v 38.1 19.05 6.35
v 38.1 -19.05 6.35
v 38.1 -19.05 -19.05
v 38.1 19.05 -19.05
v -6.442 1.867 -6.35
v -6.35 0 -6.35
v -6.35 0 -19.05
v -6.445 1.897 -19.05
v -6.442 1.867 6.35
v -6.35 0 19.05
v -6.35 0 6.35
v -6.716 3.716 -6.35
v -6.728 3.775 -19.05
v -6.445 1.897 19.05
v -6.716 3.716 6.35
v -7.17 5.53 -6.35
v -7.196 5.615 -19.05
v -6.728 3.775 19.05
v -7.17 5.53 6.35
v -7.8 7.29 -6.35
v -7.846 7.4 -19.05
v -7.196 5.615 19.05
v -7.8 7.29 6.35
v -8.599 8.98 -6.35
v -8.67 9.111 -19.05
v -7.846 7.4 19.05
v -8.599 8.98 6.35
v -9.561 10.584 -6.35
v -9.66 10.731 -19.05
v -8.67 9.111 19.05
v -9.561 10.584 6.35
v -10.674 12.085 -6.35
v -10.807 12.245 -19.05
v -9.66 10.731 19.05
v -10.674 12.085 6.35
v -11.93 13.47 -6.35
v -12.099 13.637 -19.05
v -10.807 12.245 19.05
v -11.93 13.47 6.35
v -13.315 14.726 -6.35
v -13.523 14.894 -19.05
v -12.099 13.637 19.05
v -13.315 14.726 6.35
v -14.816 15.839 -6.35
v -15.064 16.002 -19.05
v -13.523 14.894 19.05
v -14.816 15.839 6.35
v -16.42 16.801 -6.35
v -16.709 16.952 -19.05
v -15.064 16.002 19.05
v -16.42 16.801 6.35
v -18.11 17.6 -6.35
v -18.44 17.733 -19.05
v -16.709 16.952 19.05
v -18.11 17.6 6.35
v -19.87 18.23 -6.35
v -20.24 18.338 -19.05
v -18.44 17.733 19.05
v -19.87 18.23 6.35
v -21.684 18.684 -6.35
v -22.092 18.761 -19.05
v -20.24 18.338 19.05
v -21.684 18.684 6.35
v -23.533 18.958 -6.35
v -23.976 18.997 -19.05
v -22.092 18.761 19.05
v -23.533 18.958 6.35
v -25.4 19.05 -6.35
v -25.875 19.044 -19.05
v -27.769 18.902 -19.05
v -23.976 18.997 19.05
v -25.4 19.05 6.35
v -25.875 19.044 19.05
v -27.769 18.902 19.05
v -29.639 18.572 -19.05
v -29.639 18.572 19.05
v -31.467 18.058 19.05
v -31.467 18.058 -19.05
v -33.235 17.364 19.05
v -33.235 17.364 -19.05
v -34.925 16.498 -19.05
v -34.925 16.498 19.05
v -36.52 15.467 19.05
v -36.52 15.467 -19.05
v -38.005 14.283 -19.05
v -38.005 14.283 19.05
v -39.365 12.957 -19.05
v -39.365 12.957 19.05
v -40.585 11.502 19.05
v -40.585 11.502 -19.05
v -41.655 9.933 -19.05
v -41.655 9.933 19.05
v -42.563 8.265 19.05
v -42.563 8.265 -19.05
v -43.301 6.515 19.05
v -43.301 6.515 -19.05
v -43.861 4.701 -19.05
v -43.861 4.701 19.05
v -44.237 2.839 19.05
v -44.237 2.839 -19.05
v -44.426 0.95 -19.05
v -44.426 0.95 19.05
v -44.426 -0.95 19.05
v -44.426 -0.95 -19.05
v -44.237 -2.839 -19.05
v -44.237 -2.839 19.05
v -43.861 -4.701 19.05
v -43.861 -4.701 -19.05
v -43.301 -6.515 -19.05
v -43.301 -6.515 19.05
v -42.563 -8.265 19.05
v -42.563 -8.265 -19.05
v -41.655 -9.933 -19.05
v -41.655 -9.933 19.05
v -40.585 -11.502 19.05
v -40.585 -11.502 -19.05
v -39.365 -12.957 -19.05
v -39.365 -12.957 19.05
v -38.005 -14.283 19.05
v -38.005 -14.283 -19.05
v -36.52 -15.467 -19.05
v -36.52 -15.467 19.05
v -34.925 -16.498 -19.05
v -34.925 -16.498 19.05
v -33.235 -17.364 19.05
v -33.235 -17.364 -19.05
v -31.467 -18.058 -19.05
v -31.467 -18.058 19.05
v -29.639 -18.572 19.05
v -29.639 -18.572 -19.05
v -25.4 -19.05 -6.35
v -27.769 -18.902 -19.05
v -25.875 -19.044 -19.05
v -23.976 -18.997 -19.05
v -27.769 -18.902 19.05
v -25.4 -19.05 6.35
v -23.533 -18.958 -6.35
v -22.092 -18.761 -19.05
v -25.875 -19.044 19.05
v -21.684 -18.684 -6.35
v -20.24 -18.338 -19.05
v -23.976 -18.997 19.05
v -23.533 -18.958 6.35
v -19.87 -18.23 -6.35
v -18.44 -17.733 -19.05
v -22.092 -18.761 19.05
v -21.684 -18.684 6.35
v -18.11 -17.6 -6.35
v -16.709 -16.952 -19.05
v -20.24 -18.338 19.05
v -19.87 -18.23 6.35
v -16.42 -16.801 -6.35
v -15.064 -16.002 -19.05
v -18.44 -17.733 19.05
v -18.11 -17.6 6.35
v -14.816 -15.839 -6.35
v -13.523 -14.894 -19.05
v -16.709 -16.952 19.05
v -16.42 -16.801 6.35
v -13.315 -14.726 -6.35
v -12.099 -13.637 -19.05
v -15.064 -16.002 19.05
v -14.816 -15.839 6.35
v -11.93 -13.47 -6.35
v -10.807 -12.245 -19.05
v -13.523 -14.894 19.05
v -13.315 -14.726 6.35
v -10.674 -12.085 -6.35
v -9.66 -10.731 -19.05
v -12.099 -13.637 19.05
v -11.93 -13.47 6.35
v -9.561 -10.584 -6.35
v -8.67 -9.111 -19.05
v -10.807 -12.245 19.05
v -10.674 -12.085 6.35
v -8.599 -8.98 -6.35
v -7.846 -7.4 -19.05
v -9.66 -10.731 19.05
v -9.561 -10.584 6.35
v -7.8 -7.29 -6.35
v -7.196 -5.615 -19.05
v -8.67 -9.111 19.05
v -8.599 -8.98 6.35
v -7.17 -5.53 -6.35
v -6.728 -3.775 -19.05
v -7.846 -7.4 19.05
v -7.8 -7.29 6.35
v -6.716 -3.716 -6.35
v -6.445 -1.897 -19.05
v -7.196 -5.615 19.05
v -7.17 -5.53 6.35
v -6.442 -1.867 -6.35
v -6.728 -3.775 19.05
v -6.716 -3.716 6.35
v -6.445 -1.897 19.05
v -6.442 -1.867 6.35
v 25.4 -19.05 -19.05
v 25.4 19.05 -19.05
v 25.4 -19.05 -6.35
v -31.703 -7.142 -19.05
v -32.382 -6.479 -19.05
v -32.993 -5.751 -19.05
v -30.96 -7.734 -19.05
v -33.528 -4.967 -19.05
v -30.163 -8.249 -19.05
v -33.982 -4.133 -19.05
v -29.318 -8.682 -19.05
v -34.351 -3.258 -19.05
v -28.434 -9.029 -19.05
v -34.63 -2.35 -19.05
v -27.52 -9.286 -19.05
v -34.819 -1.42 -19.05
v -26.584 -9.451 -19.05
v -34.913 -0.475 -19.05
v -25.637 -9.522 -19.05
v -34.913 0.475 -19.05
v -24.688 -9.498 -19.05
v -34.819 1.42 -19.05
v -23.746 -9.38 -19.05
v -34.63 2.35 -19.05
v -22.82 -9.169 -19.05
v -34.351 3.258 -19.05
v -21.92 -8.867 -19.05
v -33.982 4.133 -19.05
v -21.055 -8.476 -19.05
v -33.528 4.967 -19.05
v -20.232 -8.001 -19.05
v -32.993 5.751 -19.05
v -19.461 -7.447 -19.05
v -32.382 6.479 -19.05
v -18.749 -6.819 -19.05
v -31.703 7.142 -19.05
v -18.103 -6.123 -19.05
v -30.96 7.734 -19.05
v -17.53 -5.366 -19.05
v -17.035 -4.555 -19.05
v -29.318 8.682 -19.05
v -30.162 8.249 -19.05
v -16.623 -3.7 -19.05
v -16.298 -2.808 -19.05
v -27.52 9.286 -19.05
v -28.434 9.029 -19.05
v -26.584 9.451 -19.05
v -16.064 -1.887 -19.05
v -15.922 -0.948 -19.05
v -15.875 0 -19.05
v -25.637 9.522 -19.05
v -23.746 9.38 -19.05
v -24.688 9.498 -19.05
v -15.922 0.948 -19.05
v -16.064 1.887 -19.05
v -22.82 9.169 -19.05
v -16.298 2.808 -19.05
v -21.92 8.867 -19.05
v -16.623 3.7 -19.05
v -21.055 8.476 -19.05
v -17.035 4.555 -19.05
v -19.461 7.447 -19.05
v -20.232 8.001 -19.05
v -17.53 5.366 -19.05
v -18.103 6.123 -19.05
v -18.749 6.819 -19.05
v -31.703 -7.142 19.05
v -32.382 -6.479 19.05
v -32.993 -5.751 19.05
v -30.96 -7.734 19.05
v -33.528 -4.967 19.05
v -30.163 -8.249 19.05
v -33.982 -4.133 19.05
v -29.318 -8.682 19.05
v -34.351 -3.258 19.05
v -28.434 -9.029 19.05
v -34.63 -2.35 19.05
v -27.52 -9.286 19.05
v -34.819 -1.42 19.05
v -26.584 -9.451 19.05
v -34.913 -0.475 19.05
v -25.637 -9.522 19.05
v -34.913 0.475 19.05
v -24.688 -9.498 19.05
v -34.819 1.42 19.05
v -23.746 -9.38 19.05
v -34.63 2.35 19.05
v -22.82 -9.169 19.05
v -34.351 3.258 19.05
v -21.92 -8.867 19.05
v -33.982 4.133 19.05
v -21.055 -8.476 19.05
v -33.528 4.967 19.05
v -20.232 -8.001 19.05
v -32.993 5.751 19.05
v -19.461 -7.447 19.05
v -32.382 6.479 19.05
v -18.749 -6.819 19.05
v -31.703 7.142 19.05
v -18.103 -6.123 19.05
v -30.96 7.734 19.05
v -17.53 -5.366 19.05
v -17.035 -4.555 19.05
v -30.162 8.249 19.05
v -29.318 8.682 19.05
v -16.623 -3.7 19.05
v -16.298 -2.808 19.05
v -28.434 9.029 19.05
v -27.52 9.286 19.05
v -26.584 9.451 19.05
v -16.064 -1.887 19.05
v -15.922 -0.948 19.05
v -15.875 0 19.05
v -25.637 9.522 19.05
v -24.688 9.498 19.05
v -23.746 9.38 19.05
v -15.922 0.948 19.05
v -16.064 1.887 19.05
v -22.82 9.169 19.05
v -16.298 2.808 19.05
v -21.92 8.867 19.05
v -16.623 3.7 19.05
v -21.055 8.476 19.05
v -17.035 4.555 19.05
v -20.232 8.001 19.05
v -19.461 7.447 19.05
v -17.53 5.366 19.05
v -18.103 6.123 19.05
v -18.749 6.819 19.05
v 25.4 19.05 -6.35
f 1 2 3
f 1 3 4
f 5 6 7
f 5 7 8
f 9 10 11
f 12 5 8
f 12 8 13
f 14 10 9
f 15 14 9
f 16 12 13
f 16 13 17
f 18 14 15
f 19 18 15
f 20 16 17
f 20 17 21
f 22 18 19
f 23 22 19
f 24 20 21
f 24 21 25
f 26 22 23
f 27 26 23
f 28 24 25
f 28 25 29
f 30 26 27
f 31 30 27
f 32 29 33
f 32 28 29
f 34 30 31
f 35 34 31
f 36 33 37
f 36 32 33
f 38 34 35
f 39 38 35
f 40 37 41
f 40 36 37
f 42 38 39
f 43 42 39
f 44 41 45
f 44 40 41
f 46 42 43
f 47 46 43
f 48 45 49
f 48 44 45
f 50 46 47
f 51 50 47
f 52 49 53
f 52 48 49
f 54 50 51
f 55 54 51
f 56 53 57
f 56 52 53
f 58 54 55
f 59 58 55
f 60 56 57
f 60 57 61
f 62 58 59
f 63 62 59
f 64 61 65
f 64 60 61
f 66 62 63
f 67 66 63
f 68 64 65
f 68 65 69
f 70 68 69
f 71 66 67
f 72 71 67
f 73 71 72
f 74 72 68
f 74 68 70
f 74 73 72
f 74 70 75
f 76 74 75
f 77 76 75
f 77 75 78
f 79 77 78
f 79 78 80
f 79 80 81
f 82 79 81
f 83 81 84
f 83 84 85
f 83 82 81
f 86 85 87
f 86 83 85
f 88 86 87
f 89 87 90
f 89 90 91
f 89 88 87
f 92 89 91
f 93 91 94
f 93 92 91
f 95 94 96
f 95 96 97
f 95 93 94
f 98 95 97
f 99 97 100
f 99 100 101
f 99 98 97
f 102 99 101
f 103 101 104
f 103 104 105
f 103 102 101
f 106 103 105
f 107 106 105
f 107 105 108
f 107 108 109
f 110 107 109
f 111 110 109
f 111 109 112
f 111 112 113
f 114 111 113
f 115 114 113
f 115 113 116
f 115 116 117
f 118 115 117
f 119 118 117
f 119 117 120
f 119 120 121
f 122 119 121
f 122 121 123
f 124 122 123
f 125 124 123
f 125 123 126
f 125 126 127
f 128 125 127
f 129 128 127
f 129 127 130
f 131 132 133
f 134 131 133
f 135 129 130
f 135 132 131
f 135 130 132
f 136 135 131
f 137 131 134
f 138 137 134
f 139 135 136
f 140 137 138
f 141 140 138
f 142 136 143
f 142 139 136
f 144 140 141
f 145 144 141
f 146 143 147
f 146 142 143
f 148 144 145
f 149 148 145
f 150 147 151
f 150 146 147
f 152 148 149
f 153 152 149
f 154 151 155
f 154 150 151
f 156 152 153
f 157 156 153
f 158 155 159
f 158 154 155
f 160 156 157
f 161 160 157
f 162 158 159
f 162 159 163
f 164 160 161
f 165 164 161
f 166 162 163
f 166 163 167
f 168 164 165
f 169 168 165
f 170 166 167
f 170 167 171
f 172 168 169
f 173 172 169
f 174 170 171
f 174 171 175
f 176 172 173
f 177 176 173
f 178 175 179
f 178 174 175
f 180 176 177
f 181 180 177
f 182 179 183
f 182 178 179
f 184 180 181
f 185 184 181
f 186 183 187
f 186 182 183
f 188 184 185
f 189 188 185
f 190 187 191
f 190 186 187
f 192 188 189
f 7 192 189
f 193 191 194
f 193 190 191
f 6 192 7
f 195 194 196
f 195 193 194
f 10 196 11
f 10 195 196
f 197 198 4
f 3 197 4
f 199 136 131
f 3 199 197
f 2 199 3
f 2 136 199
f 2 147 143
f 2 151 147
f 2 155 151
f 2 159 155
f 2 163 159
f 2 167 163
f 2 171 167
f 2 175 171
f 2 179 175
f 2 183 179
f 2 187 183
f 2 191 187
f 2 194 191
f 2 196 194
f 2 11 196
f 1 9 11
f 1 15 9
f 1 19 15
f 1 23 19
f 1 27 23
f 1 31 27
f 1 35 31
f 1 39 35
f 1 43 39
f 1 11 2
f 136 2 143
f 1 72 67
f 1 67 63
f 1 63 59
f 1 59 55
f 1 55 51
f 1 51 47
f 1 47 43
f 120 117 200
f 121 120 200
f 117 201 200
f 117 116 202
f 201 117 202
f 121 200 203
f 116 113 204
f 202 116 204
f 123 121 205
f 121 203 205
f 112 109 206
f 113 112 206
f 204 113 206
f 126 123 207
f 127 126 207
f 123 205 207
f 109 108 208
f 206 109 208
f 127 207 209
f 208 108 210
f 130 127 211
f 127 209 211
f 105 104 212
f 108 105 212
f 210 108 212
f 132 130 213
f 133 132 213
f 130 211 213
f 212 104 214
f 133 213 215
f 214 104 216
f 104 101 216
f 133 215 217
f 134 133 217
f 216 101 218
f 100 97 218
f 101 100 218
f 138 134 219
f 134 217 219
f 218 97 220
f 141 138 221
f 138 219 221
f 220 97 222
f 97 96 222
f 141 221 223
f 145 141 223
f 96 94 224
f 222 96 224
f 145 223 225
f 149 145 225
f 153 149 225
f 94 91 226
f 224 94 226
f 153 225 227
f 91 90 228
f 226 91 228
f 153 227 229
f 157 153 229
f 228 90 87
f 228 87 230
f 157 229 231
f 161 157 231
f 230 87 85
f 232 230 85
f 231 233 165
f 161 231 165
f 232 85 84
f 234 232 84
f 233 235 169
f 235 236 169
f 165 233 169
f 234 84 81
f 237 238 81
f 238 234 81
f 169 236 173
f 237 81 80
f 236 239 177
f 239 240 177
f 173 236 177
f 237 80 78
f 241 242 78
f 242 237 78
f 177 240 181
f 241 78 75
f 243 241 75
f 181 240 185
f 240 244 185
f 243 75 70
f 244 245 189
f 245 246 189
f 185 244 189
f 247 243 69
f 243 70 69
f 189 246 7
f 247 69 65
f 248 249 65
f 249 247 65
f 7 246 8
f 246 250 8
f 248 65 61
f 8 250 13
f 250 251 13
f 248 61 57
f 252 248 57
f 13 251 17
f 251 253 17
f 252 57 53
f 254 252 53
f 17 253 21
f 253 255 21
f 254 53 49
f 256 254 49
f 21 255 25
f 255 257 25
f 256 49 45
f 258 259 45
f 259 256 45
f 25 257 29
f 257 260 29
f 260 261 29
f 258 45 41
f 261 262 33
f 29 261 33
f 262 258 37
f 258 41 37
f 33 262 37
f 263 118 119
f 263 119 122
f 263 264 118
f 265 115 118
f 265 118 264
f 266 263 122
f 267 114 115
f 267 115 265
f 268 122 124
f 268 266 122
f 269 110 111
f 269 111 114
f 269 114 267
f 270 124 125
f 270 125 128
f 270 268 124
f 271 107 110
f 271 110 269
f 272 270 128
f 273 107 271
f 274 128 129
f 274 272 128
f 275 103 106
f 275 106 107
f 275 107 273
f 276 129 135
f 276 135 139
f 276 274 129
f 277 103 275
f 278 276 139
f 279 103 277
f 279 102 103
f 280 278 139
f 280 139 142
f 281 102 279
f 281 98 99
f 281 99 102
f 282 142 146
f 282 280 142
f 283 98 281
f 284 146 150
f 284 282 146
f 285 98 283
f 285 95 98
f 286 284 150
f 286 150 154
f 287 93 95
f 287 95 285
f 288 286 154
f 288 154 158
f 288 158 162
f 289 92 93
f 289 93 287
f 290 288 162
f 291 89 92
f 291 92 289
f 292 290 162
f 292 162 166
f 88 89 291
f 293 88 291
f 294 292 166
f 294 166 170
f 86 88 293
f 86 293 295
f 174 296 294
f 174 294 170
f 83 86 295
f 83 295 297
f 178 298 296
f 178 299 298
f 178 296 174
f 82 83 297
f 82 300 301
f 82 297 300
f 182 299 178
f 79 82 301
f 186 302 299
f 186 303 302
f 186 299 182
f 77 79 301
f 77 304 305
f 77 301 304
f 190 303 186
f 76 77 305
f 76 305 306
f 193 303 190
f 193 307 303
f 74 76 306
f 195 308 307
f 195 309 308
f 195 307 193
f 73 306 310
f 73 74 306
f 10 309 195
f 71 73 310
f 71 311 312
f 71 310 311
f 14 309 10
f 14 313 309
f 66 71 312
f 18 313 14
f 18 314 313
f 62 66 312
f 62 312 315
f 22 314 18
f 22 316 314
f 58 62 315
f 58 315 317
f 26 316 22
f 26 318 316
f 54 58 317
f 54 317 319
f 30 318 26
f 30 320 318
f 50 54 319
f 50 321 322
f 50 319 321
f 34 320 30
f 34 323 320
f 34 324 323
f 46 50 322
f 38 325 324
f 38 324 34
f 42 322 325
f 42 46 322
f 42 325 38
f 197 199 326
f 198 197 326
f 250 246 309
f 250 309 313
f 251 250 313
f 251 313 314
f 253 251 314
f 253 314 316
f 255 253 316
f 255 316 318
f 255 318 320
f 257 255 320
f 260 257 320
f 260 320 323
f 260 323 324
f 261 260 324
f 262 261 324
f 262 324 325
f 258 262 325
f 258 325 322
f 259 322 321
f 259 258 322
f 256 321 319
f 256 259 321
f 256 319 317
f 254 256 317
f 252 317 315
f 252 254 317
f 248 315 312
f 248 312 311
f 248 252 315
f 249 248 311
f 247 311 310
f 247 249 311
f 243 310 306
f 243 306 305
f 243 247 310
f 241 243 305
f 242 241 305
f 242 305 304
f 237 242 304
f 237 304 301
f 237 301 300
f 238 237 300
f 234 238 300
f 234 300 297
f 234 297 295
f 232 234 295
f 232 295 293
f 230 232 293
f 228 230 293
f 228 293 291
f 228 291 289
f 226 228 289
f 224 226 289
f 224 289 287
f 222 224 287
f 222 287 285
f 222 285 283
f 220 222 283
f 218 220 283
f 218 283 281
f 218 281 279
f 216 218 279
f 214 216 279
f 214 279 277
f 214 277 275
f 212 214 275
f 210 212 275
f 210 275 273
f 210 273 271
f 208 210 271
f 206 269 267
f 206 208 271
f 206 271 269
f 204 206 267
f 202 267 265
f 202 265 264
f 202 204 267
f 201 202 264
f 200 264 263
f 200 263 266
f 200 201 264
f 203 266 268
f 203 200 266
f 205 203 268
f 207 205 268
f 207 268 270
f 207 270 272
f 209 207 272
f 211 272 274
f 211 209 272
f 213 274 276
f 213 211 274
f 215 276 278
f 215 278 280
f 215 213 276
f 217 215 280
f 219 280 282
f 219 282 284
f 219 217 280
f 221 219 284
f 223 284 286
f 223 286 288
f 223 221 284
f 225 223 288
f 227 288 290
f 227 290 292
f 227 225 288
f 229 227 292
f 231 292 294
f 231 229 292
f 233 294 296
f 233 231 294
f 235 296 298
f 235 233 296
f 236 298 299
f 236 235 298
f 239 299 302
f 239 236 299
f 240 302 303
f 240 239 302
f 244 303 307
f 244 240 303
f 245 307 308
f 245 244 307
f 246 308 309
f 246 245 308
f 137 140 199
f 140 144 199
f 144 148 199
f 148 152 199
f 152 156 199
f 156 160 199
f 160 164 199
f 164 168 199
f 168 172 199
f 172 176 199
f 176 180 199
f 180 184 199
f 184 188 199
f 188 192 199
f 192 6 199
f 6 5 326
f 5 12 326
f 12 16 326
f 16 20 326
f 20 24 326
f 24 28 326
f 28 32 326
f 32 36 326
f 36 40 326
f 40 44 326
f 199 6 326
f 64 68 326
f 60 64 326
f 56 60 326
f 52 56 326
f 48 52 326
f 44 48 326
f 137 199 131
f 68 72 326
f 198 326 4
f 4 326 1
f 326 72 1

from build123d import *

# Parameters (mm, degrees)
F0_R     = 9.525
F1_DEPTH = 6.35
F2_R     = 19.05
F2_R_2   = 9.525
F3_DEPTH = 19.05
F4_W     = 12.7
F4_H     = 38.1
F5_DEPTH = 25.4


with BuildPart() as f1:
    # F0 (on Top) → F1 (new body, symmetric)
    with BuildSketch(Plane.XY):
        with BuildLine():
            ThreePointArc((-6.35, 0), (-11.929616, 13.470384), (-25.4, 19.05))
            ThreePointArc((-25.4, 19.05), (-44.45, 0), (-25.4, -19.05))
            ThreePointArc((-25.4, -19.05), (-11.929616, -13.470384), (-6.35, 0))
        make_face()
        with Locations((-25.4, 0)):
            Circle(F0_R, mode=Mode.SUBTRACT)
        with BuildLine():
            Line((25.4, 19.05), (-25.4, 19.05))
            ThreePointArc((-25.4, 19.05), (-11.929616, 13.470384), (-6.35, 0))
            ThreePointArc((-6.35, 0), (-11.929616, -13.470384), (-25.4, -19.05))
            Line((-25.4, -19.05), (25.4, -19.05))
            Line((25.4, -19.05), (25.4, 19.05))
        make_face()
    extrude(amount=F1_DEPTH, both=True)

    # F2 (on Top) → F3 (join, symmetric)
    with BuildSketch(Plane.XY):
        with Locations((-25.4, 0)):
            Circle(F2_R)
        with Locations((-25.4, 0)):
            Circle(F2_R_2, mode=Mode.SUBTRACT)
    extrude(amount=F3_DEPTH, both=True)

    # F4 (on face) → F5 (join)
    with BuildSketch(Plane.XY.offset(6.35)):
        with Locations((31.75, 0)):
            Rectangle(F4_W, F4_H)
    extrude(amount=-F5_DEPTH)


solid = f1.part
